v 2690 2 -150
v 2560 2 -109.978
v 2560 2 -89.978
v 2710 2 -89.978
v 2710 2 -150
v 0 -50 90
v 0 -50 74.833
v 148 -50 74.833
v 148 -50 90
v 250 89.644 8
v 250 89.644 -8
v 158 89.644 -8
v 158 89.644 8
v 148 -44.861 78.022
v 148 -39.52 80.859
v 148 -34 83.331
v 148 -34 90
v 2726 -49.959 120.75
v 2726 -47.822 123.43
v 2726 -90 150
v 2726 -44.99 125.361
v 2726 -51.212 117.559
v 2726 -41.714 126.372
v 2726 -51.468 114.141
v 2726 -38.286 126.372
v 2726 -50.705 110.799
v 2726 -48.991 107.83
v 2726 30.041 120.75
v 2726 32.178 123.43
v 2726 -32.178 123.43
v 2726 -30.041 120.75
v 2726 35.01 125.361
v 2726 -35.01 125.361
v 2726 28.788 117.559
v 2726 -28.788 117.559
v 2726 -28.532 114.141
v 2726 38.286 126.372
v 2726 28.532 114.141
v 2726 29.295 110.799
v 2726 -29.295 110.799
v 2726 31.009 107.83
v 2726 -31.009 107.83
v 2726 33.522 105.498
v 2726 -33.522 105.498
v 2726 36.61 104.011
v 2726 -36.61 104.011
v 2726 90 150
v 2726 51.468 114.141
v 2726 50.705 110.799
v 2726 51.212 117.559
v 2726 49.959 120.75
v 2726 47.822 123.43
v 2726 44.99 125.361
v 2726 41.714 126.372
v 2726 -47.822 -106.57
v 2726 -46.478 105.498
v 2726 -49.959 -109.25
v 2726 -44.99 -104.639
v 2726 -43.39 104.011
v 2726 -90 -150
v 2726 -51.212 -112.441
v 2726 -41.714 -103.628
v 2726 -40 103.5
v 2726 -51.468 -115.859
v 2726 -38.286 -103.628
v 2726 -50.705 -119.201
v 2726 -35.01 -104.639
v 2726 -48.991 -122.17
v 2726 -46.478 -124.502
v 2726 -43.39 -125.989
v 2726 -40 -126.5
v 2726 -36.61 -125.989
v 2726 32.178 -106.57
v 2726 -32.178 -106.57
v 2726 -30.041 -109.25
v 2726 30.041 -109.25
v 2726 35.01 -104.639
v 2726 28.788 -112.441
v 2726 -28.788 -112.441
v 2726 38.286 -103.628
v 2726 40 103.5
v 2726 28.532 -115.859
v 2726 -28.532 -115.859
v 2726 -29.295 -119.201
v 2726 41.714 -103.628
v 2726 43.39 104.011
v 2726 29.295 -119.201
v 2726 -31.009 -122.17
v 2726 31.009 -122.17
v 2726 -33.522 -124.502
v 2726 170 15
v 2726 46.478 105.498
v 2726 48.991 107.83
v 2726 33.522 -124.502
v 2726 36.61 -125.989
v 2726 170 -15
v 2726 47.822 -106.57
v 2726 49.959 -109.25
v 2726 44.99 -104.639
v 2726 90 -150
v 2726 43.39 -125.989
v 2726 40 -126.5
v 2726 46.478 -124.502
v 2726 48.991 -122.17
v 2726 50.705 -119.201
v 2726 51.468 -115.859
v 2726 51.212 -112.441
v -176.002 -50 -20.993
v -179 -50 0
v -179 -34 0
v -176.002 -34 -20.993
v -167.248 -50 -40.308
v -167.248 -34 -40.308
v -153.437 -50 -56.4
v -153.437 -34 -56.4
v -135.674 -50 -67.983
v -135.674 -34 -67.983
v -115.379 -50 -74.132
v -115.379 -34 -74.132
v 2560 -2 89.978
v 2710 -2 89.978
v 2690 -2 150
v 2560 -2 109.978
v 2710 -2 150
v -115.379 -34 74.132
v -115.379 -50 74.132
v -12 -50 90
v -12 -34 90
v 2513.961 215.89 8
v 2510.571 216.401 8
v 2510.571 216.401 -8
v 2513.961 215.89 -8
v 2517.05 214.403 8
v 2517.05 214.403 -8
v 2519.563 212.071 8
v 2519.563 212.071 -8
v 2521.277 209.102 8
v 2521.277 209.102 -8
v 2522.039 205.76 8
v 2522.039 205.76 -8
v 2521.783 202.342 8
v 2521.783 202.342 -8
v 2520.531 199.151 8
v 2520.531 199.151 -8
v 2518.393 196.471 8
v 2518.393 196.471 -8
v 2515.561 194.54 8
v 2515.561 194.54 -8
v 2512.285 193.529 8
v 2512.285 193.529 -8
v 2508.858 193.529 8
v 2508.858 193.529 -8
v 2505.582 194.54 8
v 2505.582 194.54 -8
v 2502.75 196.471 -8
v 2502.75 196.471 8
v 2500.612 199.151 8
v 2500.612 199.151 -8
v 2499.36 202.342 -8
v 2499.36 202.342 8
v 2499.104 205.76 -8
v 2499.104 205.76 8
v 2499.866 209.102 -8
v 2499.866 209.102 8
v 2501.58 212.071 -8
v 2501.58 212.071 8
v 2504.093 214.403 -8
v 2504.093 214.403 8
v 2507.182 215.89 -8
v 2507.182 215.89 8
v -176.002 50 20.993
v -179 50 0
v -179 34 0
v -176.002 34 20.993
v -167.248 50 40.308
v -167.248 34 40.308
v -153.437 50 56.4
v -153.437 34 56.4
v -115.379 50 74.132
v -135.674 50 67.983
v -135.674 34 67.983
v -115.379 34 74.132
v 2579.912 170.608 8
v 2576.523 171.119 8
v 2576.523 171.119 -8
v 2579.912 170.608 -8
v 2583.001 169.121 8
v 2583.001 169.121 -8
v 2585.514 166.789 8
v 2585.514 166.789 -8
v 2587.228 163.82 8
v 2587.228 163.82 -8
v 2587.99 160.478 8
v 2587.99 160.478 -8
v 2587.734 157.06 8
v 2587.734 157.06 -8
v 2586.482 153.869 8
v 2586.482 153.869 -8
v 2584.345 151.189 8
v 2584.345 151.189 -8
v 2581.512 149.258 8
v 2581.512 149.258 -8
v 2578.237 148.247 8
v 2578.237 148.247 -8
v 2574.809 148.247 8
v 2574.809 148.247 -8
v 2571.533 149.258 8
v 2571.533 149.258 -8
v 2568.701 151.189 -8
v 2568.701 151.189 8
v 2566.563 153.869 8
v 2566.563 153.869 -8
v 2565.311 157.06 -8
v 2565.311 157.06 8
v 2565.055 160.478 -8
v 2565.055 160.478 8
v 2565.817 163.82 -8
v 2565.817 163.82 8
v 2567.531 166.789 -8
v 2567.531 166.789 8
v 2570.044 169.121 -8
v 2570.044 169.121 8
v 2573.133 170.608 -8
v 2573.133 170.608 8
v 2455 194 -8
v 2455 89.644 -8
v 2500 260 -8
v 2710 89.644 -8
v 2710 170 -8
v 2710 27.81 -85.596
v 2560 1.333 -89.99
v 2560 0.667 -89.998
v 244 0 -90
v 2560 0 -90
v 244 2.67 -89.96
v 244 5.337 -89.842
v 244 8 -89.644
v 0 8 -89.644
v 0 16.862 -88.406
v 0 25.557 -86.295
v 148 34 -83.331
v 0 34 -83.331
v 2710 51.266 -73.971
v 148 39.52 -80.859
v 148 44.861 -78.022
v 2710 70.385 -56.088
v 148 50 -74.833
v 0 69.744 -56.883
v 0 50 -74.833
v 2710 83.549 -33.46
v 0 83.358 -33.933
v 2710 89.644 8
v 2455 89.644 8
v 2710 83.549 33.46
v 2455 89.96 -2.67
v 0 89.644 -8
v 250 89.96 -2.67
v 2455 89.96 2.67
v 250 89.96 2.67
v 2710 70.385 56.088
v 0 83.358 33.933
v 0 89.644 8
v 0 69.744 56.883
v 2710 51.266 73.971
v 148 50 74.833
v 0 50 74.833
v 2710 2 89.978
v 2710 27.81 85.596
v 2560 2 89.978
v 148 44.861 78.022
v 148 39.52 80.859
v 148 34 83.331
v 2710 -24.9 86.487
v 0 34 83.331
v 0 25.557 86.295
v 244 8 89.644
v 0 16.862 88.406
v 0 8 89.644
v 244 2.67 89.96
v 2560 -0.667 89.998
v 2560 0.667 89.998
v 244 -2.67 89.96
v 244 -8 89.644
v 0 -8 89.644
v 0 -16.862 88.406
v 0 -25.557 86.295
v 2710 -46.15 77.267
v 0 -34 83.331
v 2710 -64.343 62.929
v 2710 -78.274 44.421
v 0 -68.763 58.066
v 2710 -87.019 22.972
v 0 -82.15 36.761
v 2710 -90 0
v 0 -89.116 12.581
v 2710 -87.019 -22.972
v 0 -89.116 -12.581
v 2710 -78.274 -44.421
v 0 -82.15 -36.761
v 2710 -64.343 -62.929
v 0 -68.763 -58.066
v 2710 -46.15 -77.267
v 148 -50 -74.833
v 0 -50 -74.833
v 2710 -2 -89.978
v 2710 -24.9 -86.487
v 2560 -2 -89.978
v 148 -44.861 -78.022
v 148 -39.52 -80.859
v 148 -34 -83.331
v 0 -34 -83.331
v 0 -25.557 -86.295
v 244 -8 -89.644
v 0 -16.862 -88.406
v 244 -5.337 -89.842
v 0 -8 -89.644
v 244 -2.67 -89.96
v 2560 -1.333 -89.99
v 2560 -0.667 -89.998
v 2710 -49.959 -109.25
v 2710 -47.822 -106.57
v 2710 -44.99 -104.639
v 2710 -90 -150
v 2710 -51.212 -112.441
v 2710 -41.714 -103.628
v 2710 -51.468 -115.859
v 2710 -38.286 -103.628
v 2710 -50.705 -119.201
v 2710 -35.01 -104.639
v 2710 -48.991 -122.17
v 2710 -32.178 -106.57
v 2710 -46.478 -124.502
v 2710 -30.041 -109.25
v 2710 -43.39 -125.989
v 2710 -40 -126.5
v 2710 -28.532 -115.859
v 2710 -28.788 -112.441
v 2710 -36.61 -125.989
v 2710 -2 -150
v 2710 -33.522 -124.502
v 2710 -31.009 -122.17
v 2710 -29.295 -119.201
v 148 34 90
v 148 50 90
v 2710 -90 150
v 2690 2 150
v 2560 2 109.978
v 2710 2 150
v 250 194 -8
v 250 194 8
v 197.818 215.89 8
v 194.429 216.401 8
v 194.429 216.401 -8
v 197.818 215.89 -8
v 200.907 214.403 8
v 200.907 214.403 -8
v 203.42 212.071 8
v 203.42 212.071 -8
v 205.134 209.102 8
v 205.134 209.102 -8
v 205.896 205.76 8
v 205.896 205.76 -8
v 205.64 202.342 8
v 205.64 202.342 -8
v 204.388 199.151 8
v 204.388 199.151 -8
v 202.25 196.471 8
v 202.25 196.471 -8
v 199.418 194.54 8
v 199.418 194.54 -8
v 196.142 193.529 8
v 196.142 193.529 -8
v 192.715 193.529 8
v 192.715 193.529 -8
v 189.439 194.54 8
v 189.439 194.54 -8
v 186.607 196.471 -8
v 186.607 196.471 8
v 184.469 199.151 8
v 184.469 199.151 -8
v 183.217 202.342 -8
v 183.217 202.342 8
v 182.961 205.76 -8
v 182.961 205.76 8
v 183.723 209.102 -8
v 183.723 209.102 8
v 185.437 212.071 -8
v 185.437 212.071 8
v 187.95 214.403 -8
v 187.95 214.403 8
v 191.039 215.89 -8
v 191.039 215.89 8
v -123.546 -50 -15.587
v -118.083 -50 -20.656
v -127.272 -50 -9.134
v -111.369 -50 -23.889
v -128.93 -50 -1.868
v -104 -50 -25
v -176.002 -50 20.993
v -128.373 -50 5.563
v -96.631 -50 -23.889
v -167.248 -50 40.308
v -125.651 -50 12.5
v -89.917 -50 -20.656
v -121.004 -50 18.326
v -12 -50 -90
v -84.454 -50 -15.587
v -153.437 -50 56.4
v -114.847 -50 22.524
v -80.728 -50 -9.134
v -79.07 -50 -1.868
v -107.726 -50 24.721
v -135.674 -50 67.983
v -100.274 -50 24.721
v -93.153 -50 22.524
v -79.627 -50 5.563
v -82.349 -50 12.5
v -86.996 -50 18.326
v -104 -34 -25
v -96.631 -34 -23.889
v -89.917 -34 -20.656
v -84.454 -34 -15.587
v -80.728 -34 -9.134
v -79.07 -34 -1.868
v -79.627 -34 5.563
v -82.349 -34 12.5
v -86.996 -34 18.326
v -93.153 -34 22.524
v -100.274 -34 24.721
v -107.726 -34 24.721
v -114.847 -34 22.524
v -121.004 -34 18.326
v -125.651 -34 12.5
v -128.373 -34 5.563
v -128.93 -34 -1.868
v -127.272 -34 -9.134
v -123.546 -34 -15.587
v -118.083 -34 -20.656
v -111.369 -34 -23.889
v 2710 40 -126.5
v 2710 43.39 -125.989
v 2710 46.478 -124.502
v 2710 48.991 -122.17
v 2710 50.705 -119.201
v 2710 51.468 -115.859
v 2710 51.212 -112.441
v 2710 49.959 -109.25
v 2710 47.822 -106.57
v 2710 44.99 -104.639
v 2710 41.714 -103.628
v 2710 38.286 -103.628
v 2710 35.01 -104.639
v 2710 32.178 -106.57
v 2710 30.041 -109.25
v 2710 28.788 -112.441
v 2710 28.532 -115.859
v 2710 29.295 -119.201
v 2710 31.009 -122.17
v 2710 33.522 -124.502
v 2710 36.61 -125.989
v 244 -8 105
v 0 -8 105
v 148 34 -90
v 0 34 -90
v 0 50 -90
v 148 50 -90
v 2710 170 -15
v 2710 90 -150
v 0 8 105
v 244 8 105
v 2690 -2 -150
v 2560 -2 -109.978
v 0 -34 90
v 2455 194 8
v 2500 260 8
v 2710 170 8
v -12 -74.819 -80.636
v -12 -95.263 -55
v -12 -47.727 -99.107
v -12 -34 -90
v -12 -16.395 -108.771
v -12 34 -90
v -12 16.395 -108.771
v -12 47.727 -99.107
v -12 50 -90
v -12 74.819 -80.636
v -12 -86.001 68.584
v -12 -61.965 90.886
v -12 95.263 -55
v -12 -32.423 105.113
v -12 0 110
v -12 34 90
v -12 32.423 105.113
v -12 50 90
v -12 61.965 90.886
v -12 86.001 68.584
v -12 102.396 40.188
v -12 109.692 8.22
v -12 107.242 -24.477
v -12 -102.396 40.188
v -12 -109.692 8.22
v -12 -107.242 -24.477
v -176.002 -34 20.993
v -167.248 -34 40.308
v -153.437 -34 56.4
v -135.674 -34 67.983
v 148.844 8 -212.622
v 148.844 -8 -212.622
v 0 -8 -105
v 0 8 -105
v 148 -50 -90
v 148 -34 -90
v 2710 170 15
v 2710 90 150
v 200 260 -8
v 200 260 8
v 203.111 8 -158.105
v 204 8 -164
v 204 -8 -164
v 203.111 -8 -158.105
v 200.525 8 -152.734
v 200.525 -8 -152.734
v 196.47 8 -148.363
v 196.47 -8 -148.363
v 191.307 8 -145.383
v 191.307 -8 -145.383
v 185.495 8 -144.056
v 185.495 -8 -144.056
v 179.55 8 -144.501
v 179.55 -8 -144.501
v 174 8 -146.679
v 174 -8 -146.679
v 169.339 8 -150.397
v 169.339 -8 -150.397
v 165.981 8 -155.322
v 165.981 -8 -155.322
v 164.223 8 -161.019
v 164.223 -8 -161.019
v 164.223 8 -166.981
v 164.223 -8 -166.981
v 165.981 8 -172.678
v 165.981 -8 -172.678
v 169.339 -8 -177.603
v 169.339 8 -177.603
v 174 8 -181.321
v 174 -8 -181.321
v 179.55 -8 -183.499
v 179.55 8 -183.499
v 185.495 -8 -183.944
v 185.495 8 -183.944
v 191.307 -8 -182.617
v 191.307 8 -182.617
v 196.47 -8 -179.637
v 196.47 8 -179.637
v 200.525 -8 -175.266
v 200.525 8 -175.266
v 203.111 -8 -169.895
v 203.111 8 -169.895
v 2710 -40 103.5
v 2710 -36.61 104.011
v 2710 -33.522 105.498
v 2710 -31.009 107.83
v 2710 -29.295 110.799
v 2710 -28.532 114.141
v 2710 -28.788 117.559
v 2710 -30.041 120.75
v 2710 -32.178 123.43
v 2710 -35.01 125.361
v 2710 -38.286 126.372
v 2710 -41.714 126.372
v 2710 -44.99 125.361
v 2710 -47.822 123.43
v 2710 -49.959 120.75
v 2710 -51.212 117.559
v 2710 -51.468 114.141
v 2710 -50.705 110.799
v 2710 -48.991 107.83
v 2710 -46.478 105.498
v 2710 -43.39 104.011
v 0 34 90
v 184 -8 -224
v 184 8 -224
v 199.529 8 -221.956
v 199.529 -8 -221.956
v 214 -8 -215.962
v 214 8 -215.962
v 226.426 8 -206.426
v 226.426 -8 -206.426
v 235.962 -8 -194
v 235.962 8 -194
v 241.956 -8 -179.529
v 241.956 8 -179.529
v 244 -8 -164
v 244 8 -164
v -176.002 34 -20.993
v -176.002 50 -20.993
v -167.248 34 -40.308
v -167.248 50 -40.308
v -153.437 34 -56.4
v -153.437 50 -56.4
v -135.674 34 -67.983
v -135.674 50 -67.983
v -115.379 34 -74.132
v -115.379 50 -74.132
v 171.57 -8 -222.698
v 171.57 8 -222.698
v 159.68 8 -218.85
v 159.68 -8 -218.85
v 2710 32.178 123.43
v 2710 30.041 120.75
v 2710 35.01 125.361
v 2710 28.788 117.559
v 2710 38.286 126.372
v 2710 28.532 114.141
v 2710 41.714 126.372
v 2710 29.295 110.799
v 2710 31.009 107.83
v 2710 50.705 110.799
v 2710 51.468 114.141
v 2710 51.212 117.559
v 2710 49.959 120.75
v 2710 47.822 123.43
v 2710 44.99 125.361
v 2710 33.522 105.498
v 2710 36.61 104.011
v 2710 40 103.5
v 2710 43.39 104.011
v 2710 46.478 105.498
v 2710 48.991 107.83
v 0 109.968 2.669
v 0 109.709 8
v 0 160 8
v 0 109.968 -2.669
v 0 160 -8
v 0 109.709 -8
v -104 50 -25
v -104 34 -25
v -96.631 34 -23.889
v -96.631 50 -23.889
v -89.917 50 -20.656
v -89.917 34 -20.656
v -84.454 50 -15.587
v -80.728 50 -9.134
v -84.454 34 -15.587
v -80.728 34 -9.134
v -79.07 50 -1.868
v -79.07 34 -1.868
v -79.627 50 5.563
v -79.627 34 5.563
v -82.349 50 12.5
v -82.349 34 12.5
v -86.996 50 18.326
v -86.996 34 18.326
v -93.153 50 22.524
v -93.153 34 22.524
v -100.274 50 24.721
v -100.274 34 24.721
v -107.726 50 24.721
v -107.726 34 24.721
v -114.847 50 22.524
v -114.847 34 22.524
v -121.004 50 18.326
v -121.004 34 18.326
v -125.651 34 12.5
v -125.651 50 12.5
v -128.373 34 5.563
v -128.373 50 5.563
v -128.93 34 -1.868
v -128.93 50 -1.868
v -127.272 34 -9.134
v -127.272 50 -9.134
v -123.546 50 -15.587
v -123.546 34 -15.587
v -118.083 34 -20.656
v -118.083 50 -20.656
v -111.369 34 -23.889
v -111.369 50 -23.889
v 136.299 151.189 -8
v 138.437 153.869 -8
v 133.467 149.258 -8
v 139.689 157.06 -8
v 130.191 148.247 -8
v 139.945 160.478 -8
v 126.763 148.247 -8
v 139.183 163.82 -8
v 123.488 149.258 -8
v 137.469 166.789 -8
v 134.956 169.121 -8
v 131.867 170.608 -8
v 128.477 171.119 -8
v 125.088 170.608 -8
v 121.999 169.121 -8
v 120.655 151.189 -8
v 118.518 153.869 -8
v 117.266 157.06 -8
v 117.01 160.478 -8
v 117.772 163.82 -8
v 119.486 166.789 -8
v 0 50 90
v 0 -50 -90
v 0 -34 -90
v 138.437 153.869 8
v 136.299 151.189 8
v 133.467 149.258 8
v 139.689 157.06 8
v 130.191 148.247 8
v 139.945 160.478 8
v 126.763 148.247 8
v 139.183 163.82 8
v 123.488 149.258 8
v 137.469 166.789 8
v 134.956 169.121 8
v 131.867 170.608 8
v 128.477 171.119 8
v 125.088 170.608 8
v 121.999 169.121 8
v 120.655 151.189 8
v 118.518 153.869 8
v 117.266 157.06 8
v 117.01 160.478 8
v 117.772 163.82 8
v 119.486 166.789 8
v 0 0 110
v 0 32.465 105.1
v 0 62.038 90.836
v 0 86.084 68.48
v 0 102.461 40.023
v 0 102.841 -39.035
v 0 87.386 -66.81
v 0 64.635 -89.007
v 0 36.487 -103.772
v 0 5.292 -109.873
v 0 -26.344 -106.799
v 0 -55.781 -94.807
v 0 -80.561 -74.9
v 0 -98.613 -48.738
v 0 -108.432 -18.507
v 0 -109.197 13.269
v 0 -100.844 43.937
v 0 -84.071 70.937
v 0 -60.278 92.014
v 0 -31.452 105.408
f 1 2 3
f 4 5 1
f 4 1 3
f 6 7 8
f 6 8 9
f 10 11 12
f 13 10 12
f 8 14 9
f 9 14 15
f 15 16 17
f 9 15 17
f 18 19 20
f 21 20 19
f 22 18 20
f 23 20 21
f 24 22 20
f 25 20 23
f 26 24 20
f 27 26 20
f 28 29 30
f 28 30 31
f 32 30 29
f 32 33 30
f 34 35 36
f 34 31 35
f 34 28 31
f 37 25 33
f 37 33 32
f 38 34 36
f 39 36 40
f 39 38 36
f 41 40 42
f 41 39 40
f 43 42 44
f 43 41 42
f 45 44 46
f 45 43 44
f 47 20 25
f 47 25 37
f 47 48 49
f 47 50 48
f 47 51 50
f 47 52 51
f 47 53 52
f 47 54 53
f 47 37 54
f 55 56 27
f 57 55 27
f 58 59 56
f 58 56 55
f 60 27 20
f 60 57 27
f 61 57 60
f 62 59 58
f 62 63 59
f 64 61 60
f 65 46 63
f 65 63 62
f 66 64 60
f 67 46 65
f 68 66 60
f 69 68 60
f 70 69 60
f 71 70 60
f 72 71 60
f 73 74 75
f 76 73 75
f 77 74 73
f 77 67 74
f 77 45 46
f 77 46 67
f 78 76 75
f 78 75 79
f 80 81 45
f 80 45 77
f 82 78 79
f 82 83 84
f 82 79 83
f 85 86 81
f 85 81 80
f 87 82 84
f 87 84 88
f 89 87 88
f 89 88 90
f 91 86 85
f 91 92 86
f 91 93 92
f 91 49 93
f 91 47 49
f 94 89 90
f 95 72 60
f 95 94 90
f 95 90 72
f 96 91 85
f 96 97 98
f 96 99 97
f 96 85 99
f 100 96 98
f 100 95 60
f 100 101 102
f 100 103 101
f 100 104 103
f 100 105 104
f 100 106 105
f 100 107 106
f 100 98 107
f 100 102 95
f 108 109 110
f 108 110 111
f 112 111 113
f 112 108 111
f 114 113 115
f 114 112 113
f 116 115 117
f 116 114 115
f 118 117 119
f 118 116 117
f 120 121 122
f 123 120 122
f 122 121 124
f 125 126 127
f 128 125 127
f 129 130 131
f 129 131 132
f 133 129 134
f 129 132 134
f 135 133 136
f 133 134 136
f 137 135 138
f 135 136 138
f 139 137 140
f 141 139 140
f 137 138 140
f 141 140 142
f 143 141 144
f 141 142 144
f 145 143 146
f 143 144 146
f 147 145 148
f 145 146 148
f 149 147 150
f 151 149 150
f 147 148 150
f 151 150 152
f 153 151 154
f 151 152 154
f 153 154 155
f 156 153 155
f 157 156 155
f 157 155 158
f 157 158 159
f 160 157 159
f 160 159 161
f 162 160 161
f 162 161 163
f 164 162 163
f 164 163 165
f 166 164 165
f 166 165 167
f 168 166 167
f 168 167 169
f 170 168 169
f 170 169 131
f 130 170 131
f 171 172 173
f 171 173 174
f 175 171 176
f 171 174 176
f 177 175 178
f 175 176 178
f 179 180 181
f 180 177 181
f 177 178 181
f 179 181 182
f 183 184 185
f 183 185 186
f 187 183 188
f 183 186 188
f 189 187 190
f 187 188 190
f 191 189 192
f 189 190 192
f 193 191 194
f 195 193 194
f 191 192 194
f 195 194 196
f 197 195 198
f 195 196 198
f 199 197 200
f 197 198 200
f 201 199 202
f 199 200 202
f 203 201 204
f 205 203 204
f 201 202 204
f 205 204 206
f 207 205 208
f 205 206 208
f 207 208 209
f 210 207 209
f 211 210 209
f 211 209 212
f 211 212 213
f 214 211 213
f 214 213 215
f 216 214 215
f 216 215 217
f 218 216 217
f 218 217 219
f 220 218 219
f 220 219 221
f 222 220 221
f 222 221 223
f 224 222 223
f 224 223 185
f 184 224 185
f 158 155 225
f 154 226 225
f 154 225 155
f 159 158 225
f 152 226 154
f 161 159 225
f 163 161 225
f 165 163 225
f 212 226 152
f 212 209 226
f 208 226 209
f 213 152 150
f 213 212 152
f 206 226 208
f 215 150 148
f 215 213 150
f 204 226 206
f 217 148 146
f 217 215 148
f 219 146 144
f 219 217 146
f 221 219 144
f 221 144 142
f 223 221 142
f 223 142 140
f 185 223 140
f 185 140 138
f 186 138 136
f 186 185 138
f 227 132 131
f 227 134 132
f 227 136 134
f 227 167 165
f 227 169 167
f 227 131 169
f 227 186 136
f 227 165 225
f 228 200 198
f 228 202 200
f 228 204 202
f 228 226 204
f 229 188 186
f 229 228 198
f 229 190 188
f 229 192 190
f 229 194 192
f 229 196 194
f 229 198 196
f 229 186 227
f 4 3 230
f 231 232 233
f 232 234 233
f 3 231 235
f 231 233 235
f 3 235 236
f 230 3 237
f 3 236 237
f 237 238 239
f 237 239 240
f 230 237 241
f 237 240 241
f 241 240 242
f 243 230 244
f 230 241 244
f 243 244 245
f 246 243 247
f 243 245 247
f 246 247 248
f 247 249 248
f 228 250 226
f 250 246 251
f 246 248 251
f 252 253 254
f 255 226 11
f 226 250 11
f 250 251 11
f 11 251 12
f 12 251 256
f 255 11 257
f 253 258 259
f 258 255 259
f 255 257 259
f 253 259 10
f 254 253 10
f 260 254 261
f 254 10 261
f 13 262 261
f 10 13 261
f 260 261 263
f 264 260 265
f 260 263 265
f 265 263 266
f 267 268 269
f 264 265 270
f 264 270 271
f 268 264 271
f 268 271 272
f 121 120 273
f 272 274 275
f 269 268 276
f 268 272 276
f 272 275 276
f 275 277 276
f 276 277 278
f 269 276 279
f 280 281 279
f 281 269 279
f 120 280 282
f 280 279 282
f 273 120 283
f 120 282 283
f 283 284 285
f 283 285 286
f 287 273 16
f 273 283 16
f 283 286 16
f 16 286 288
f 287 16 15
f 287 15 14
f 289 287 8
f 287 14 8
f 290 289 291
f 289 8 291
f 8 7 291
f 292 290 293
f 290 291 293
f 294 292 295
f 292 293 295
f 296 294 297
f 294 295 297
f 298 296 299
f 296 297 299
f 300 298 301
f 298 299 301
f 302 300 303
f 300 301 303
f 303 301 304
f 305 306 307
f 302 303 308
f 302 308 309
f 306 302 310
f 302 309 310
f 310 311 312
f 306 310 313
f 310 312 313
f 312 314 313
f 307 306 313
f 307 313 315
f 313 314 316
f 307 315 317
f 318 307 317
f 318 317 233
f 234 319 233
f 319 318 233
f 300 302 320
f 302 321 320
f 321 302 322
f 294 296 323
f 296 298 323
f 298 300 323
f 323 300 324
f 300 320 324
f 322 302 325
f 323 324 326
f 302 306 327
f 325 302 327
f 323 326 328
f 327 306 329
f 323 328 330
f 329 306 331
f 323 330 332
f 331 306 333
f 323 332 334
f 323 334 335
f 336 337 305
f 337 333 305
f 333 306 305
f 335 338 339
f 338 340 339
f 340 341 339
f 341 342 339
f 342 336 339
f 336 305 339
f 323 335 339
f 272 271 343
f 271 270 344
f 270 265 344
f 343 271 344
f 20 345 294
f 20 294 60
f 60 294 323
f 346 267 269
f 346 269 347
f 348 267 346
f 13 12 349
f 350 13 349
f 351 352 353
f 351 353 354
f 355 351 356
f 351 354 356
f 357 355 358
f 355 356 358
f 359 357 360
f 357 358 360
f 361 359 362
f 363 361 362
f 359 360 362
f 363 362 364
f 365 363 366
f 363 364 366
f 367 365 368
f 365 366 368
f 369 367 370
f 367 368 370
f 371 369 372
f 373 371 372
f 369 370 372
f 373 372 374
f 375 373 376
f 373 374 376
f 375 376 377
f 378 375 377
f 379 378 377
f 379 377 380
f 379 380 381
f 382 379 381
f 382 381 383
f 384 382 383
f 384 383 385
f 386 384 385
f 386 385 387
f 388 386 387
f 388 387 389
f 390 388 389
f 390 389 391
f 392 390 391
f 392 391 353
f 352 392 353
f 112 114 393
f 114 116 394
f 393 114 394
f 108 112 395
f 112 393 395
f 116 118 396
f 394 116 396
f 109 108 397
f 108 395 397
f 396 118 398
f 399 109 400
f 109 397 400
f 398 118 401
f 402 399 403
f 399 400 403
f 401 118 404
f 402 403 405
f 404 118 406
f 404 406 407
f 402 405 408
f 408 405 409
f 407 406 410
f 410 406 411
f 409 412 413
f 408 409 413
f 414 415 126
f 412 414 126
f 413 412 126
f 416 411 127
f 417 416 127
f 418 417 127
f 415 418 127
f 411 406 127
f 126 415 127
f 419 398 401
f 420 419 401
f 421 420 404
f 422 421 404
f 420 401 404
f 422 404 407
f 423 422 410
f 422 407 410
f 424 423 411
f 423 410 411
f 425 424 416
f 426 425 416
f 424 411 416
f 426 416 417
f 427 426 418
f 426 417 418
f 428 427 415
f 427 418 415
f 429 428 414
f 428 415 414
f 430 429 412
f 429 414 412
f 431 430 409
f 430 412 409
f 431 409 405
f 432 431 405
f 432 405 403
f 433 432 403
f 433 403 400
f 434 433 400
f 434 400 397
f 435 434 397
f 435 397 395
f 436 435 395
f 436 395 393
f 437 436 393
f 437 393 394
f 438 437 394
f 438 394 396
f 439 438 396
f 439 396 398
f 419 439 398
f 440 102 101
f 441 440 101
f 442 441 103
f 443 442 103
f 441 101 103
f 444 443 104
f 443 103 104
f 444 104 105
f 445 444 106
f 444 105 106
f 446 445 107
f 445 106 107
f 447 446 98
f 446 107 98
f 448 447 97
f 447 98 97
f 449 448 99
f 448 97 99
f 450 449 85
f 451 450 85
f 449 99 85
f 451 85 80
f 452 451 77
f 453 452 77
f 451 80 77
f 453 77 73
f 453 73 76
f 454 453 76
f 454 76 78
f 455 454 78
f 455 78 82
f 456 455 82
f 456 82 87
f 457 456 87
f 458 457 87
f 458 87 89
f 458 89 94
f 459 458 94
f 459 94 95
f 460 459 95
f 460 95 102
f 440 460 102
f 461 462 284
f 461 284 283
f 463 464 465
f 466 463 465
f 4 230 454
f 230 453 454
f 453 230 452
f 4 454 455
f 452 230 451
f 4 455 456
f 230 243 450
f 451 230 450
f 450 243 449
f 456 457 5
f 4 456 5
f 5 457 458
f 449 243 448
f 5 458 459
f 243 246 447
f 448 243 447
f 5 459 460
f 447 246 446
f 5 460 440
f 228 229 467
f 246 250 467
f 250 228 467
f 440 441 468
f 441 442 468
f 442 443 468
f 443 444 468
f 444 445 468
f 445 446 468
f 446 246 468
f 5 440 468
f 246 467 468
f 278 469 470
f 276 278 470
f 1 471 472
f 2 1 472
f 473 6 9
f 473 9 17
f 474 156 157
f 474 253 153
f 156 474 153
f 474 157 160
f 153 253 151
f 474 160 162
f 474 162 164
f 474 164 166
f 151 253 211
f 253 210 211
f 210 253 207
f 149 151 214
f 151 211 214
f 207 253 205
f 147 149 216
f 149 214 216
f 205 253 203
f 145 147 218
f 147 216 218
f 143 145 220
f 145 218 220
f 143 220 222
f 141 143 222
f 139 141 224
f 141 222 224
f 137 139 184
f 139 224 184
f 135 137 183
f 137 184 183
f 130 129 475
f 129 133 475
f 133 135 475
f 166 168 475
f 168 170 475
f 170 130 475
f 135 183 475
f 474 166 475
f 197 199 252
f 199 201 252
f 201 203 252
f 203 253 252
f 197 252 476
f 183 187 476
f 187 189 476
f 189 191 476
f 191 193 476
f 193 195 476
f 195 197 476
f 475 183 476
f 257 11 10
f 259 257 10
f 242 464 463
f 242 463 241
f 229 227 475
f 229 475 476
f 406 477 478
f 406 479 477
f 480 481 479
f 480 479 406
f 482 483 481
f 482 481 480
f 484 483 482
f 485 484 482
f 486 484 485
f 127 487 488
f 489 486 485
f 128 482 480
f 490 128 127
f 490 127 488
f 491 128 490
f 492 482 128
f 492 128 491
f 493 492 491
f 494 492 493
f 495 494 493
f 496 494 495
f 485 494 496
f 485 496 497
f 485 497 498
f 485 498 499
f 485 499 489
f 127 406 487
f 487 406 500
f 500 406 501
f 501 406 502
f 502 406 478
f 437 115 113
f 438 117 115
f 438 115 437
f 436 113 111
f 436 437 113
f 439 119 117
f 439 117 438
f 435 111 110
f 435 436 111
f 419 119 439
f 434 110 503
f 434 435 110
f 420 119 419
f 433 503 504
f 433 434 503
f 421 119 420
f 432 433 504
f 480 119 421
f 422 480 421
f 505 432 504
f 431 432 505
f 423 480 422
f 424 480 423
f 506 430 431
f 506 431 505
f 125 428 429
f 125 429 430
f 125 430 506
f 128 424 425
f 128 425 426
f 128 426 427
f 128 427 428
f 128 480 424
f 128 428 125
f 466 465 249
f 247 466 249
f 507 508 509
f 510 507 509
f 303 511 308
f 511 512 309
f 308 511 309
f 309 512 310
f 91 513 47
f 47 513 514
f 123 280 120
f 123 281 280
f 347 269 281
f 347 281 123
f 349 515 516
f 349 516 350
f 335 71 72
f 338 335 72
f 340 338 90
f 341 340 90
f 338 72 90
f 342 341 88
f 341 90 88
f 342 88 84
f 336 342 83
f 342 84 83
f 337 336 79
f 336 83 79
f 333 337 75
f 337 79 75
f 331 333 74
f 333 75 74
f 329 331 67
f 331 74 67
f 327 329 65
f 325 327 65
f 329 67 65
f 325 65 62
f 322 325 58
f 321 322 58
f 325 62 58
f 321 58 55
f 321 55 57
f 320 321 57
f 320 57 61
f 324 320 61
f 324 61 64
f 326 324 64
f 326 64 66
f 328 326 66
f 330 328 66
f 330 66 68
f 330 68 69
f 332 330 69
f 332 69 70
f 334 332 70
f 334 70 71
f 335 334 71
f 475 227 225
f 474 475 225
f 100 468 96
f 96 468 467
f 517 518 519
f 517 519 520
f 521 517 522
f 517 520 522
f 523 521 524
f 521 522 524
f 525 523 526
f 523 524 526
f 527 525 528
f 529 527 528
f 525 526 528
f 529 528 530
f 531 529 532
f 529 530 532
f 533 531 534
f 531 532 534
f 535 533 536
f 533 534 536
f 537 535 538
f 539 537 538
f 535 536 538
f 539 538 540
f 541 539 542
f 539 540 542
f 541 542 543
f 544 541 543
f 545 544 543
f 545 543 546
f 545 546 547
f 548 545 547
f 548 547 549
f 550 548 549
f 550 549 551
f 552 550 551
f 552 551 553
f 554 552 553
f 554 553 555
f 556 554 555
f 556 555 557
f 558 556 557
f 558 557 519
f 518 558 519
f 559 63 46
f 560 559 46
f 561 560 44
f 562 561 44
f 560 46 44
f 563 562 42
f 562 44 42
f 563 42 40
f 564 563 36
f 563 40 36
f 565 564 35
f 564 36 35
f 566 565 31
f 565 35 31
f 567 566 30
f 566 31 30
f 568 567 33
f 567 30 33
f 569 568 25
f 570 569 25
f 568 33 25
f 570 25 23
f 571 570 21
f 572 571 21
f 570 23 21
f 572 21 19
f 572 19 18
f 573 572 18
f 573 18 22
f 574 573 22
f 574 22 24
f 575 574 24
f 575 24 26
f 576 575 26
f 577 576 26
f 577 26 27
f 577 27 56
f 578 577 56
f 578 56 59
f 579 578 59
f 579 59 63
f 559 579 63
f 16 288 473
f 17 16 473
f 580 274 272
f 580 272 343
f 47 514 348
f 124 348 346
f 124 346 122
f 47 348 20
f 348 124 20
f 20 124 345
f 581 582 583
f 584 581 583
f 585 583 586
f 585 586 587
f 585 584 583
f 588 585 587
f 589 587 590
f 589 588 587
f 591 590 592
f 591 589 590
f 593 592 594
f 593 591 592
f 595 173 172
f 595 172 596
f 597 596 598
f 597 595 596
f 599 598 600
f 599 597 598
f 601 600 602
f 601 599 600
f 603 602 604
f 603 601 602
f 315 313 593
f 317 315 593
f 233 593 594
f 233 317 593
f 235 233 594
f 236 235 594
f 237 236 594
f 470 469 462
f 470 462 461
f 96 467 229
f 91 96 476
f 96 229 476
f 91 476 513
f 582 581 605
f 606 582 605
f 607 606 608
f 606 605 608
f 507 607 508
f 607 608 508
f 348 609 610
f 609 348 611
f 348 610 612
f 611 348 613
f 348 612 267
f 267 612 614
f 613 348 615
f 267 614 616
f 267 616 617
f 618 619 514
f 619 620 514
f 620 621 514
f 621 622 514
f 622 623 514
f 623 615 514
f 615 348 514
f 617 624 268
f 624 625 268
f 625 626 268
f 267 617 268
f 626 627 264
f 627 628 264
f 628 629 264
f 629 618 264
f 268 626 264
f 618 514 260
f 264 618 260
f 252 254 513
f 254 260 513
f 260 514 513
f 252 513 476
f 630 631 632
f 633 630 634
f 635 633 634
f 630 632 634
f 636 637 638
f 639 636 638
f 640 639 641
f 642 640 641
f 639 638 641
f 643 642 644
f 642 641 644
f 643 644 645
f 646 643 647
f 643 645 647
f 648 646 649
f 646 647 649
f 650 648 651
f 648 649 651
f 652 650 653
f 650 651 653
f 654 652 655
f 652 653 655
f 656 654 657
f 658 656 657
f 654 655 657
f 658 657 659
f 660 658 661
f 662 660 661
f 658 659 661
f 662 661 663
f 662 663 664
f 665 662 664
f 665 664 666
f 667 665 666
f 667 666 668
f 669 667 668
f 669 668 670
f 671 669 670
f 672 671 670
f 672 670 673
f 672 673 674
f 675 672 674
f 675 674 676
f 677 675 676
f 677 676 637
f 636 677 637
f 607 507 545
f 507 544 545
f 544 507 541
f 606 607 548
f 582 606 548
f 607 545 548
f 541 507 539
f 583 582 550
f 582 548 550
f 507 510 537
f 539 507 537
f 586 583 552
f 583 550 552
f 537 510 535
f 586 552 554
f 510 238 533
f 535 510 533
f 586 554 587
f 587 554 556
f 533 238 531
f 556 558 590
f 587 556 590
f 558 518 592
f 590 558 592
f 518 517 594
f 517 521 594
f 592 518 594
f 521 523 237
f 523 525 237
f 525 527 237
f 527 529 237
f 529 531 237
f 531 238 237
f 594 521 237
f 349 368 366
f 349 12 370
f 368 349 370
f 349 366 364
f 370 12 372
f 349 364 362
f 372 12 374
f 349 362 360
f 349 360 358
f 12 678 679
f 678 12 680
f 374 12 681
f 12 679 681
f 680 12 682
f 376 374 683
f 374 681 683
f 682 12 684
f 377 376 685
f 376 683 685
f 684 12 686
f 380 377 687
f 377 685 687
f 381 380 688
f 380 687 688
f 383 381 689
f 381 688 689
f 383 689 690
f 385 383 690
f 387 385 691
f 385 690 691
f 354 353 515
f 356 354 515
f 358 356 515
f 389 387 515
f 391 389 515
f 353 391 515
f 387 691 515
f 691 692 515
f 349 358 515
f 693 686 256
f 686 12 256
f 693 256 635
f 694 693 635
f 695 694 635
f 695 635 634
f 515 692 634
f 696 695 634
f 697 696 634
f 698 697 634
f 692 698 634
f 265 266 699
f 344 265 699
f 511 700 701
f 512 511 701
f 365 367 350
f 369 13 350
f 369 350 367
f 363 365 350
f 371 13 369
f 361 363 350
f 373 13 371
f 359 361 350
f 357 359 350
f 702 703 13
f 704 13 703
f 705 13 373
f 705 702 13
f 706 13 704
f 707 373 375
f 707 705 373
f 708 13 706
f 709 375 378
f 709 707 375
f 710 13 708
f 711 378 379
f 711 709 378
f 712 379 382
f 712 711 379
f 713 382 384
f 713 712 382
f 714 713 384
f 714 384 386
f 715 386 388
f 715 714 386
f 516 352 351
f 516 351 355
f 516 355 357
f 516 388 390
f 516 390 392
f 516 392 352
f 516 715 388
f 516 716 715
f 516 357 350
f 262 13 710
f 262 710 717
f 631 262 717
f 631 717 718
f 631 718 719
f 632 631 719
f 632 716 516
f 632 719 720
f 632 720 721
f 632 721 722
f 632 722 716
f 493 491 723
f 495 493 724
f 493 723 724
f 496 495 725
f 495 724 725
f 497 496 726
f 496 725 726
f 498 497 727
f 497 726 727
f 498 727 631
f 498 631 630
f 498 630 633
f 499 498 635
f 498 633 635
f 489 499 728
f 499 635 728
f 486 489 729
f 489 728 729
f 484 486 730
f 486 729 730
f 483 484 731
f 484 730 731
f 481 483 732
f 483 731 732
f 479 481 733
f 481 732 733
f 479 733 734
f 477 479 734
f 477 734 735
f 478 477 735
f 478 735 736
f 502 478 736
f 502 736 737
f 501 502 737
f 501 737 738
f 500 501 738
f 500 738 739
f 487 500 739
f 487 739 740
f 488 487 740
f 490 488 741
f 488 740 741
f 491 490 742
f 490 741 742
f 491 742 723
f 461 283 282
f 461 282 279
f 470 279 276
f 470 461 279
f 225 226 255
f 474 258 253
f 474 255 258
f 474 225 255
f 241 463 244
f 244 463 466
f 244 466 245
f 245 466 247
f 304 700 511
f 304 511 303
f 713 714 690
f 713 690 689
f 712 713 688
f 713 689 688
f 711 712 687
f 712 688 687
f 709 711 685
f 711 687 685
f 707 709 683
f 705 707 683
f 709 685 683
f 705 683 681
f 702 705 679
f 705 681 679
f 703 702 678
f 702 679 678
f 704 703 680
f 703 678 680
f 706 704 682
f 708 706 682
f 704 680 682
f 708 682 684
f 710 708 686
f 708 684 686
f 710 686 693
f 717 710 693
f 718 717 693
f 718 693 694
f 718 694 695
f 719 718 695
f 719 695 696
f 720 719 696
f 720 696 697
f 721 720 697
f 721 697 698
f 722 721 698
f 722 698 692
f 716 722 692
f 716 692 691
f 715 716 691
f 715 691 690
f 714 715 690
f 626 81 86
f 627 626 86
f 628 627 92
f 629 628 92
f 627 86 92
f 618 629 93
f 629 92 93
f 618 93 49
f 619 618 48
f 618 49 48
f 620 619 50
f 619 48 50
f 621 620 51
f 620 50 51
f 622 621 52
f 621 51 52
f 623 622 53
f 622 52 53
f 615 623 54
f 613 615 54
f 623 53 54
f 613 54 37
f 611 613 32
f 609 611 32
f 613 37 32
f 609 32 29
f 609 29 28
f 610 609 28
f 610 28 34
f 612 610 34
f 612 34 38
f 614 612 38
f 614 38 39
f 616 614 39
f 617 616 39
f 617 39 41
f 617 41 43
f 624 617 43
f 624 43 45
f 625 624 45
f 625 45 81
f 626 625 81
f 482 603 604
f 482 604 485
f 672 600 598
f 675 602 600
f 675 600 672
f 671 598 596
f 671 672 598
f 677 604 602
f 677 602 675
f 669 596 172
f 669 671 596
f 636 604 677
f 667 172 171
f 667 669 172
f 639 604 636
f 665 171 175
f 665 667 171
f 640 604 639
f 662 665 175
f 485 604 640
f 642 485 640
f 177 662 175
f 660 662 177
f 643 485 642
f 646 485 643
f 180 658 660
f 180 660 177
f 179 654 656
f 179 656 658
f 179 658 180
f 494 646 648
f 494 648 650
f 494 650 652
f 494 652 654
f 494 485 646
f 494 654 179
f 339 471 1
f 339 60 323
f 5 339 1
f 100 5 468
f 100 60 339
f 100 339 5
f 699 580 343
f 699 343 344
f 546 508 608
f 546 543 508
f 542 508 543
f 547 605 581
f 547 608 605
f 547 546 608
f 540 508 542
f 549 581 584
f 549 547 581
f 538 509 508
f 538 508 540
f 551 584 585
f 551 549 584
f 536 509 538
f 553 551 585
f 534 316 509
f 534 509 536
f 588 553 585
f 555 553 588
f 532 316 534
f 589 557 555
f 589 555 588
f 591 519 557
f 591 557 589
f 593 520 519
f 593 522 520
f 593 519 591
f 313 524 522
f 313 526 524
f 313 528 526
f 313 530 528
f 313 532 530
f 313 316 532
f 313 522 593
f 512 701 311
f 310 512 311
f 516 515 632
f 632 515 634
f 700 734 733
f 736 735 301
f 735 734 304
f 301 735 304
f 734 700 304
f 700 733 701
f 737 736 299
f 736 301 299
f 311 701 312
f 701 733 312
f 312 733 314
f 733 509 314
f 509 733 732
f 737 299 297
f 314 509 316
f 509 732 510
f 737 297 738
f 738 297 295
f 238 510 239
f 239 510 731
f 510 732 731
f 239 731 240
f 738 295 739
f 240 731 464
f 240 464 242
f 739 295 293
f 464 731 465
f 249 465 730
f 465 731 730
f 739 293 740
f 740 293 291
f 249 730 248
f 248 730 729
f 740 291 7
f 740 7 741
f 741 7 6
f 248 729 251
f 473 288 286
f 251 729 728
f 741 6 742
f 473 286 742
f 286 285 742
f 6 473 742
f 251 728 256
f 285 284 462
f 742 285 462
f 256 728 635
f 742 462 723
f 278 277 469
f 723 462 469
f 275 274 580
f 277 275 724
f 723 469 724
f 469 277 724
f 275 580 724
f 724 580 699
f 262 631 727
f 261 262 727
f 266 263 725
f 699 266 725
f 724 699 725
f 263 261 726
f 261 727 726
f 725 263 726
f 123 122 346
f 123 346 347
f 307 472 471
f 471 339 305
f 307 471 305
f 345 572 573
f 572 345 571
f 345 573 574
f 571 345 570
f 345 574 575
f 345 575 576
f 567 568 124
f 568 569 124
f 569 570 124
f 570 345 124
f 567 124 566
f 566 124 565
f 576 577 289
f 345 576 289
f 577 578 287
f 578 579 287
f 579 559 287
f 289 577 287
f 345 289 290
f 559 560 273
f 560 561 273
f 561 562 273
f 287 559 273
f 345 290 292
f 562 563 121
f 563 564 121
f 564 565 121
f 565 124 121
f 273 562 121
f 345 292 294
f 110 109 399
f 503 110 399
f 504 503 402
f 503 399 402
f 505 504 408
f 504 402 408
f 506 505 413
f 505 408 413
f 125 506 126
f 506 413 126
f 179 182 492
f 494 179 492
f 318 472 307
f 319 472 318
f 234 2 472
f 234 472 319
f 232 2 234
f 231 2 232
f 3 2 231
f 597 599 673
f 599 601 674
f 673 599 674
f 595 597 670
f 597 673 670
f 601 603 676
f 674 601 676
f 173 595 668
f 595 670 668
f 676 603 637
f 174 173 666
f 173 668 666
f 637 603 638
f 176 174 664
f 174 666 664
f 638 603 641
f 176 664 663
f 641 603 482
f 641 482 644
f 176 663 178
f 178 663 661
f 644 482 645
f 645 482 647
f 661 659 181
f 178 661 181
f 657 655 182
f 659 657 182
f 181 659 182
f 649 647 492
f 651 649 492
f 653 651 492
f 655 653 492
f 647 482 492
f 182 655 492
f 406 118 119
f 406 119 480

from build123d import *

# Parameters (mm, degrees)
SKETCH_2_R           = 90
EXTRUDE_1_DEPTH      = 2710
EXTRUDE_2_DEPTH      = 16
SKETCH_4_R           = 11.5
CUT_EXTRUDE_1_DEPTH  = 2736.411486413
SKETCH_5_W           = 300
SKETCH_5_H           = 4
EXTRUDE_3_DEPTH      = 150
CUT_EXTRUDE_2_DEPTH  = 2736.536510449
SKETCH_7_W           = 16
SKETCH_7_H           = 260
EXTRUDE_4_DEPTH      = 255
CUT_EXTRUDE_3_DEPTH  = 2743.925445578
CUT_EXTRUDE_4_DEPTH  = 2743.925445578
SKETCH_11_R          = 11.5
CUT_EXTRUDE_5_DEPTH  = 2743.925445578
SKETCH_12_R          = 110
EXTRUDE_5_DEPTH      = 12
SKETCH_14_W          = 16
SKETCH_14_H          = 260
EXTRUDE_6_DEPTH      = 250
CUT_EXTRUDE_7_DEPTH  = 2743.925445578
CUT_EXTRUDE_8_DEPTH  = 2743.925445578
SKETCH_17_R          = 11.5
CUT_EXTRUDE_9_DEPTH  = 2743.925445578
SKETCH_18_W          = 180
SKETCH_18_H          = 16
EXTRUDE_7_DEPTH      = 167
CUT_EXTRUDE_10_DEPTH = 2748.667374338
CUT_EXTRUDE_11_DEPTH = 2748.667374338
SKETCH_21_R          = 25
CUT_EXTRUDE_12_DEPTH = 2748.667374338
SKETCH_22_W          = 180
SKETCH_22_H          = 16
EXTRUDE_8_DEPTH      = 160
SKETCH_23_W          = 244
SKETCH_23_H          = 16
EXTRUDE_9_DEPTH      = 329
CUT_EXTRUDE_13_DEPTH = 2749.286011317
CUT_EXTRUDE_14_DEPTH = 2749.286011317
SKETCH_27_R          = 20
CUT_EXTRUDE_15_DEPTH = 2749.286011317


with BuildPart() as part:
    # 草图2 → 凸台-拉伸1 (new body)
    with BuildSketch(Plane(origin=(0, 0, 0), x_dir=(0, 0, -1), z_dir=(1, 0, 0))):
        Circle(SKETCH_2_R)
    extrude(amount=EXTRUDE_1_DEPTH)

    # 草图3 → 凸台-拉伸2 (add)
    with BuildSketch(Plane(origin=(2710, 0, 0), x_dir=(0, 0, -1), z_dir=(1, 0, 0))):
        Polygon((-150, -90), (150, -90), (150, 90), (15, 170), (-15, 170), (-150, 90), align=None)
    extrude(amount=EXTRUDE_2_DEPTH)

    # 草图4 → 切除-拉伸1 (cut, through all)
    with BuildSketch(Plane(origin=(2726, 0, 0), x_dir=(0, 0, -1), z_dir=(1, 0, 0))):
        with Locations((115, -40)):
            Circle(SKETCH_4_R)
        with Locations((115, 40)):
            Circle(SKETCH_4_R)
        with Locations((-115, 40)):
            Circle(SKETCH_4_R)
        with Locations((-115, -40)):
            Circle(SKETCH_4_R)
    extrude(amount=-CUT_EXTRUDE_1_DEPTH, mode=Mode.SUBTRACT)

    # 草图5 → 凸台-拉伸3 (add)
    with BuildSketch(Plane.ZY.offset(-2710)):
        Rectangle(SKETCH_5_W, SKETCH_5_H)
    extrude(amount=EXTRUDE_3_DEPTH)

    # 草图6 → 切除-拉伸2 (cut, through all)
    with BuildSketch(Plane.XZ.offset(2)):
        Polygon((2690, 150), (2560, 109.977775034), (2560, 150), align=None)
        Polygon((2560, -109.977775034), (2560, -150), (2690, -150), align=None)
    extrude(amount=-CUT_EXTRUDE_2_DEPTH, mode=Mode.SUBTRACT)

    # 草图7 → 凸台-拉伸4 (add)
    with BuildSketch(Plane.ZY.offset(-2710)):
        with Locations((0, 130)):
            Rectangle(SKETCH_7_W, SKETCH_7_H)
    extrude(amount=EXTRUDE_4_DEPTH)

    # 草图9 → 切除-拉伸3 (cut, through all)
    with BuildSketch(Plane(origin=(0, 0, -8), x_dir=(-1, 0, 0), z_dir=(0, 0, -1))):
        Polygon((-2710, 260), (-2500, 260), (-2710, 170), align=None)
    extrude(amount=-CUT_EXTRUDE_3_DEPTH, mode=Mode.SUBTRACT)

    # 草图10 → 切除-拉伸4 (cut, through all)
    with BuildSketch(Plane(origin=(0, 0, -8), x_dir=(-1, 0, 0), z_dir=(0, 0, -1))):
        Polygon((-2500, 260), (-2455, 194), (-2455, 260), align=None)
    extrude(amount=-CUT_EXTRUDE_4_DEPTH, mode=Mode.SUBTRACT)

    # 草图11 → 切除-拉伸5 (cut, through all)
    with BuildSketch(Plane(origin=(0, 0, -8), x_dir=(-1, 0, 0), z_dir=(0, 0, -1))):
        with Locations((-2576.522543277, 159.619021786)):
            Circle(SKETCH_11_R)
        with Locations((-2510.571491725, 204.901013782)):
            Circle(SKETCH_11_R)
    extrude(amount=-CUT_EXTRUDE_5_DEPTH, mode=Mode.SUBTRACT)

    # 草图12 → 凸台-拉伸5 (add)
    with BuildSketch(Plane.ZY):
        Circle(SKETCH_12_R)
    extrude(amount=EXTRUDE_5_DEPTH)

    # 草图14 → 凸台-拉伸6 (add)
    with BuildSketch(Plane(origin=(0, 0, 0), x_dir=(0, 0, -1), z_dir=(1, 0, 0))):
        with Locations((0, 130)):
            Rectangle(SKETCH_14_W, SKETCH_14_H)
    extrude(amount=EXTRUDE_6_DEPTH)

    # 草图15 → 切除-拉伸7 (cut, through all)
    with BuildSketch(Plane(origin=(0, 0, -8), x_dir=(-1, 0, 0), z_dir=(0, 0, -1))):
        Polygon((-250, 194), (-250, 89.643739324), (-158, 89.643739324), align=None)
        Polygon((-200, 260), (0, 160), (0, 260), align=None)
    extrude(amount=-CUT_EXTRUDE_7_DEPTH, mode=Mode.SUBTRACT)

    # 草图16 → 切除-拉伸8 (cut, through all)
    with BuildSketch(Plane(origin=(0, 0, -8), x_dir=(-1, 0, 0), z_dir=(0, 0, -1))):
        Polygon((-250, 260), (-200, 260), (-250, 194), align=None)
    extrude(amount=-CUT_EXTRUDE_8_DEPTH, mode=Mode.SUBTRACT)

    # 草图17 → 切除-拉伸9 (cut, through all)
    with BuildSketch(Plane(origin=(0, 0, -8), x_dir=(-1, 0, 0), z_dir=(0, 0, -1))):
        with Locations((-128.477456723, 159.619021786)):
            Circle(SKETCH_17_R)
        with Locations((-194.428508275, 204.901013782)):
            Circle(SKETCH_17_R)
    extrude(amount=-CUT_EXTRUDE_9_DEPTH, mode=Mode.SUBTRACT)

    # 草图18 → 凸台-拉伸7 (add)
    with BuildSketch(Plane.ZY.offset(12)):
        with Locations((0, 42)):
            Rectangle(SKETCH_18_W, SKETCH_18_H)
        with Locations((0, -42)):
            Rectangle(SKETCH_18_W, SKETCH_18_H)
    extrude(amount=EXTRUDE_7_DEPTH)

    # 草图19 → 切除-拉伸10 (cut, through all)
    with BuildSketch(Plane.XZ.offset(50)):
        with BuildLine():
            Line((-115.378912249, 74.131776965), (-12, 90))
            Line((-12, 90), (-179, 90))
            Line((-179, 90), (-179, 0))
            ThreePointArc((-179, 0), (-160.914051071, 48.844557431), (-115.378912249, 74.131776965))
        make_face()
    extrude(amount=-CUT_EXTRUDE_10_DEPTH, mode=Mode.SUBTRACT)

    # 草图20 → 切除-拉伸11 (cut, through all)
    with BuildSketch(Plane.XZ.offset(50)):
        with BuildLine():
            Line((-115.378912249, -74.131776965), (-12, -90))
            Line((-12, -90), (-179, -90))
            Line((-179, -90), (-179, 0))
            ThreePointArc((-179, 0), (-160.914051071, -48.844557431), (-115.378912249, -74.131776965))
        make_face()
    extrude(amount=-CUT_EXTRUDE_11_DEPTH, mode=Mode.SUBTRACT)

    # 草图21 → 切除-拉伸12 (cut, through all)
    with BuildSketch(Plane.XZ.offset(50)):
        with Locations((-104, 0)):
            Circle(SKETCH_21_R)
    extrude(amount=-CUT_EXTRUDE_12_DEPTH, mode=Mode.SUBTRACT)

    # 草图22 → 凸台-拉伸8 (add)
    with BuildSketch(Plane.ZY.offset(12)):
        with Locations((0, 42)):
            Rectangle(SKETCH_22_W, SKETCH_22_H)
        with Locations((0, -42)):
            Rectangle(SKETCH_22_W, SKETCH_22_H)
    extrude(amount=-EXTRUDE_8_DEPTH)

    # 草图23 → 凸台-拉伸9 (add)
    with BuildSketch(Plane.XY.offset(105)):
        with Locations((122, 0)):
            Rectangle(SKETCH_23_W, SKETCH_23_H)
    extrude(amount=-EXTRUDE_9_DEPTH)

    # 草图25 → 切除-拉伸13 (cut, through all)
    with BuildSketch(Plane(origin=(0, -8, 0), x_dir=(-1, 0, 0), z_dir=(0, -1, 0))):
        with BuildLine():
            Line((-244, 164), (-244, 224))
            Line((-244, 224), (-184, 224))
            ThreePointArc((-184, 224), (-226.426406871, 206.426406871), (-244, 164))
        make_face()
    extrude(amount=-CUT_EXTRUDE_13_DEPTH, mode=Mode.SUBTRACT)

    # 草图26 → 切除-拉伸14 (cut, through all)
    with BuildSketch(Plane.XZ.offset(8)):
        with BuildLine():
            Line((148.844142163, -212.62165834), (0, -105))
            Line((0, -105), (0, -224))
            Line((0, -224), (184, -224))
            ThreePointArc((184, -224), (165.524333576, -221.084584173), (148.844142163, -212.62165834))
        make_face()
    extrude(amount=-CUT_EXTRUDE_14_DEPTH, mode=Mode.SUBTRACT)

    # 草图27 → 切除-拉伸15 (cut, through all)
    with BuildSketch(Plane.XZ.offset(8)):
        with Locations((184, -164)):
            Circle(SKETCH_27_R)
    extrude(amount=-CUT_EXTRUDE_15_DEPTH, mode=Mode.SUBTRACT)


solid = part.part
